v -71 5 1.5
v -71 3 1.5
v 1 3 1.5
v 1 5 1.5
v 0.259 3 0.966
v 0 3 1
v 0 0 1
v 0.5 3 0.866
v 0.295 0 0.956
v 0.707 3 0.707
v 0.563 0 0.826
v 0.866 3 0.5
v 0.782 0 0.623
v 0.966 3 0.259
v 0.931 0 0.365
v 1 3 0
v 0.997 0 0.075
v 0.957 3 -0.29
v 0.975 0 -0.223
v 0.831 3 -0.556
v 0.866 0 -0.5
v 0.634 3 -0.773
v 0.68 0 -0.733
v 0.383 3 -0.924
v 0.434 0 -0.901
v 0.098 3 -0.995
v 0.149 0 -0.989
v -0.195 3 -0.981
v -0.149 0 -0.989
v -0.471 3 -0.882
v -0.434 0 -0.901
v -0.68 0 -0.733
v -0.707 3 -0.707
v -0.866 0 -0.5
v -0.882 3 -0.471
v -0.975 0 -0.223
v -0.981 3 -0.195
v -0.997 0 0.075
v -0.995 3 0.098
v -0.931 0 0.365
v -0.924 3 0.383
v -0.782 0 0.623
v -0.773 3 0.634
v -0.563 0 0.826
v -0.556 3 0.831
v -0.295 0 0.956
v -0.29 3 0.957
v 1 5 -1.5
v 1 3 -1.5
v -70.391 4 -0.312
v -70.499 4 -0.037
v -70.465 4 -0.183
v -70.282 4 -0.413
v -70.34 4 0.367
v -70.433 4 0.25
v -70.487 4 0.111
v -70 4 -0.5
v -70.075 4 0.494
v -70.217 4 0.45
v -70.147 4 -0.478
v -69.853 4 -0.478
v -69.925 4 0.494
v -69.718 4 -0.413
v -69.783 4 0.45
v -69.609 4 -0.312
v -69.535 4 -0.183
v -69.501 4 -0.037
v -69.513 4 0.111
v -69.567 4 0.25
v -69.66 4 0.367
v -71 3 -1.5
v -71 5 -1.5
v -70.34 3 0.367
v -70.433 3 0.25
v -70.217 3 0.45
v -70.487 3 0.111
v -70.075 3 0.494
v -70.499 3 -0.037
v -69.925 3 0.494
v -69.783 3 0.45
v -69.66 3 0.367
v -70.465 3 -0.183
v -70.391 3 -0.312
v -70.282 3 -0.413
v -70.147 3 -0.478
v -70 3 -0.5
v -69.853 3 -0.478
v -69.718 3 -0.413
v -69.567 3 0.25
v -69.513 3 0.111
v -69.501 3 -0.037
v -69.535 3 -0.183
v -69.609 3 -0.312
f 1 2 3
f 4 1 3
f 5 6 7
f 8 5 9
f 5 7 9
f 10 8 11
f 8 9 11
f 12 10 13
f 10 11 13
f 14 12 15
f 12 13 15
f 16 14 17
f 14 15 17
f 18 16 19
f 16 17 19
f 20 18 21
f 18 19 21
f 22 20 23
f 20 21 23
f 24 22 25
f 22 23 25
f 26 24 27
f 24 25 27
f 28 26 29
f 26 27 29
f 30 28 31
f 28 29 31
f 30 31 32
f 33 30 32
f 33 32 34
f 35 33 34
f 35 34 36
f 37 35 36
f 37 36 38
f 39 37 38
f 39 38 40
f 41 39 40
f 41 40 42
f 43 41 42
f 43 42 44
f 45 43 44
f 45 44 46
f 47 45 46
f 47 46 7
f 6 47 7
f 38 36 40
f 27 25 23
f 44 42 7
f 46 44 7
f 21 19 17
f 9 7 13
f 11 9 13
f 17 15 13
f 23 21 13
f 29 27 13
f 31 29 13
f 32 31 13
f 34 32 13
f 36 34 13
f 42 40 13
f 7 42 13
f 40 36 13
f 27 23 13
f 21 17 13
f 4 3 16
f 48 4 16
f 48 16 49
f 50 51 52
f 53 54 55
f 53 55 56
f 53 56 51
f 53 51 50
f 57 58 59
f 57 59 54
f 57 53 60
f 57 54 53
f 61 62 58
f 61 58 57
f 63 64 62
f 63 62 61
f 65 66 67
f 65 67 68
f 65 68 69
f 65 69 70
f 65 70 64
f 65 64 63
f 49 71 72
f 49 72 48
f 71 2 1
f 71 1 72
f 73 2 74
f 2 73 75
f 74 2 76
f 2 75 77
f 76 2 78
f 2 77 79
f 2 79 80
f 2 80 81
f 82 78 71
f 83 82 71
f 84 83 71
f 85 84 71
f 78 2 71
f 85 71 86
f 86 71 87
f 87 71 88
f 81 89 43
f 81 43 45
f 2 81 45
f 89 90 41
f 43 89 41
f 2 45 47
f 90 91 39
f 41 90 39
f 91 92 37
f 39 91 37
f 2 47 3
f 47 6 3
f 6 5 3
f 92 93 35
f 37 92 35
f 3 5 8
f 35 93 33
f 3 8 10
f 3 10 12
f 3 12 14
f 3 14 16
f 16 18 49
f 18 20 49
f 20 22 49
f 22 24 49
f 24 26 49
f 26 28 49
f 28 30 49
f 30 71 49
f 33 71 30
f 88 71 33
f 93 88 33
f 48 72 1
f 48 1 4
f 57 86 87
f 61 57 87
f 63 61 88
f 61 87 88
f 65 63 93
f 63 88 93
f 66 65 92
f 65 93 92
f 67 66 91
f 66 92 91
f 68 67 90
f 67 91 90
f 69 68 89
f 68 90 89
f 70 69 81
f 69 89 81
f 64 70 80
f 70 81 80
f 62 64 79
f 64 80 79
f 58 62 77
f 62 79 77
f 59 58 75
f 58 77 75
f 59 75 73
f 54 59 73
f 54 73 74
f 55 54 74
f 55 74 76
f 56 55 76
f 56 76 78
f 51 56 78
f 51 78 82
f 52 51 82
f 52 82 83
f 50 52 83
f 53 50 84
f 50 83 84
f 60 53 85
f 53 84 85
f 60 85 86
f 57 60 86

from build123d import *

# Parameters (mm, degrees)
SKETCH1_R           = 1
BOSS_EXTRUDE1_DEPTH = 3
SKETCH2_W           = 72
SKETCH2_H           = 3
BOSS_EXTRUDE2_DEPTH = 2
SKETCH3_R           = 0.5
CUT_EXTRUDE6_DEPTH  = 1


with BuildPart() as part:
    # Sketch1 → Boss-Extrude1 (new body)
    with BuildSketch(Plane(origin=(0, 0, 0), x_dir=(1, 0, 0), z_dir=(0, 1, 0))):
        with Locations(Location((0, 0, 0), (0, 0, 270))):
            Circle(SKETCH1_R)
    extrude(amount=BOSS_EXTRUDE1_DEPTH)

    # Sketch2 → Boss-Extrude2 (add)
    with BuildSketch(Plane(origin=(0, 3, 0), x_dir=(1, 0, 0), z_dir=(0, 1, 0))):
        with Locations((-35, 0)):
            Rectangle(SKETCH2_W, SKETCH2_H)
    extrude(amount=BOSS_EXTRUDE2_DEPTH)

    # Sketch3 → Cut-Extrude6 (cut)
    with BuildSketch(Plane.XZ.offset(-3)):
        with Locations(Location((-70, 0, 0), (0, 0, 270))):
            Circle(SKETCH3_R)
    extrude(amount=-CUT_EXTRUDE6_DEPTH, mode=Mode.SUBTRACT)


solid = part.part
